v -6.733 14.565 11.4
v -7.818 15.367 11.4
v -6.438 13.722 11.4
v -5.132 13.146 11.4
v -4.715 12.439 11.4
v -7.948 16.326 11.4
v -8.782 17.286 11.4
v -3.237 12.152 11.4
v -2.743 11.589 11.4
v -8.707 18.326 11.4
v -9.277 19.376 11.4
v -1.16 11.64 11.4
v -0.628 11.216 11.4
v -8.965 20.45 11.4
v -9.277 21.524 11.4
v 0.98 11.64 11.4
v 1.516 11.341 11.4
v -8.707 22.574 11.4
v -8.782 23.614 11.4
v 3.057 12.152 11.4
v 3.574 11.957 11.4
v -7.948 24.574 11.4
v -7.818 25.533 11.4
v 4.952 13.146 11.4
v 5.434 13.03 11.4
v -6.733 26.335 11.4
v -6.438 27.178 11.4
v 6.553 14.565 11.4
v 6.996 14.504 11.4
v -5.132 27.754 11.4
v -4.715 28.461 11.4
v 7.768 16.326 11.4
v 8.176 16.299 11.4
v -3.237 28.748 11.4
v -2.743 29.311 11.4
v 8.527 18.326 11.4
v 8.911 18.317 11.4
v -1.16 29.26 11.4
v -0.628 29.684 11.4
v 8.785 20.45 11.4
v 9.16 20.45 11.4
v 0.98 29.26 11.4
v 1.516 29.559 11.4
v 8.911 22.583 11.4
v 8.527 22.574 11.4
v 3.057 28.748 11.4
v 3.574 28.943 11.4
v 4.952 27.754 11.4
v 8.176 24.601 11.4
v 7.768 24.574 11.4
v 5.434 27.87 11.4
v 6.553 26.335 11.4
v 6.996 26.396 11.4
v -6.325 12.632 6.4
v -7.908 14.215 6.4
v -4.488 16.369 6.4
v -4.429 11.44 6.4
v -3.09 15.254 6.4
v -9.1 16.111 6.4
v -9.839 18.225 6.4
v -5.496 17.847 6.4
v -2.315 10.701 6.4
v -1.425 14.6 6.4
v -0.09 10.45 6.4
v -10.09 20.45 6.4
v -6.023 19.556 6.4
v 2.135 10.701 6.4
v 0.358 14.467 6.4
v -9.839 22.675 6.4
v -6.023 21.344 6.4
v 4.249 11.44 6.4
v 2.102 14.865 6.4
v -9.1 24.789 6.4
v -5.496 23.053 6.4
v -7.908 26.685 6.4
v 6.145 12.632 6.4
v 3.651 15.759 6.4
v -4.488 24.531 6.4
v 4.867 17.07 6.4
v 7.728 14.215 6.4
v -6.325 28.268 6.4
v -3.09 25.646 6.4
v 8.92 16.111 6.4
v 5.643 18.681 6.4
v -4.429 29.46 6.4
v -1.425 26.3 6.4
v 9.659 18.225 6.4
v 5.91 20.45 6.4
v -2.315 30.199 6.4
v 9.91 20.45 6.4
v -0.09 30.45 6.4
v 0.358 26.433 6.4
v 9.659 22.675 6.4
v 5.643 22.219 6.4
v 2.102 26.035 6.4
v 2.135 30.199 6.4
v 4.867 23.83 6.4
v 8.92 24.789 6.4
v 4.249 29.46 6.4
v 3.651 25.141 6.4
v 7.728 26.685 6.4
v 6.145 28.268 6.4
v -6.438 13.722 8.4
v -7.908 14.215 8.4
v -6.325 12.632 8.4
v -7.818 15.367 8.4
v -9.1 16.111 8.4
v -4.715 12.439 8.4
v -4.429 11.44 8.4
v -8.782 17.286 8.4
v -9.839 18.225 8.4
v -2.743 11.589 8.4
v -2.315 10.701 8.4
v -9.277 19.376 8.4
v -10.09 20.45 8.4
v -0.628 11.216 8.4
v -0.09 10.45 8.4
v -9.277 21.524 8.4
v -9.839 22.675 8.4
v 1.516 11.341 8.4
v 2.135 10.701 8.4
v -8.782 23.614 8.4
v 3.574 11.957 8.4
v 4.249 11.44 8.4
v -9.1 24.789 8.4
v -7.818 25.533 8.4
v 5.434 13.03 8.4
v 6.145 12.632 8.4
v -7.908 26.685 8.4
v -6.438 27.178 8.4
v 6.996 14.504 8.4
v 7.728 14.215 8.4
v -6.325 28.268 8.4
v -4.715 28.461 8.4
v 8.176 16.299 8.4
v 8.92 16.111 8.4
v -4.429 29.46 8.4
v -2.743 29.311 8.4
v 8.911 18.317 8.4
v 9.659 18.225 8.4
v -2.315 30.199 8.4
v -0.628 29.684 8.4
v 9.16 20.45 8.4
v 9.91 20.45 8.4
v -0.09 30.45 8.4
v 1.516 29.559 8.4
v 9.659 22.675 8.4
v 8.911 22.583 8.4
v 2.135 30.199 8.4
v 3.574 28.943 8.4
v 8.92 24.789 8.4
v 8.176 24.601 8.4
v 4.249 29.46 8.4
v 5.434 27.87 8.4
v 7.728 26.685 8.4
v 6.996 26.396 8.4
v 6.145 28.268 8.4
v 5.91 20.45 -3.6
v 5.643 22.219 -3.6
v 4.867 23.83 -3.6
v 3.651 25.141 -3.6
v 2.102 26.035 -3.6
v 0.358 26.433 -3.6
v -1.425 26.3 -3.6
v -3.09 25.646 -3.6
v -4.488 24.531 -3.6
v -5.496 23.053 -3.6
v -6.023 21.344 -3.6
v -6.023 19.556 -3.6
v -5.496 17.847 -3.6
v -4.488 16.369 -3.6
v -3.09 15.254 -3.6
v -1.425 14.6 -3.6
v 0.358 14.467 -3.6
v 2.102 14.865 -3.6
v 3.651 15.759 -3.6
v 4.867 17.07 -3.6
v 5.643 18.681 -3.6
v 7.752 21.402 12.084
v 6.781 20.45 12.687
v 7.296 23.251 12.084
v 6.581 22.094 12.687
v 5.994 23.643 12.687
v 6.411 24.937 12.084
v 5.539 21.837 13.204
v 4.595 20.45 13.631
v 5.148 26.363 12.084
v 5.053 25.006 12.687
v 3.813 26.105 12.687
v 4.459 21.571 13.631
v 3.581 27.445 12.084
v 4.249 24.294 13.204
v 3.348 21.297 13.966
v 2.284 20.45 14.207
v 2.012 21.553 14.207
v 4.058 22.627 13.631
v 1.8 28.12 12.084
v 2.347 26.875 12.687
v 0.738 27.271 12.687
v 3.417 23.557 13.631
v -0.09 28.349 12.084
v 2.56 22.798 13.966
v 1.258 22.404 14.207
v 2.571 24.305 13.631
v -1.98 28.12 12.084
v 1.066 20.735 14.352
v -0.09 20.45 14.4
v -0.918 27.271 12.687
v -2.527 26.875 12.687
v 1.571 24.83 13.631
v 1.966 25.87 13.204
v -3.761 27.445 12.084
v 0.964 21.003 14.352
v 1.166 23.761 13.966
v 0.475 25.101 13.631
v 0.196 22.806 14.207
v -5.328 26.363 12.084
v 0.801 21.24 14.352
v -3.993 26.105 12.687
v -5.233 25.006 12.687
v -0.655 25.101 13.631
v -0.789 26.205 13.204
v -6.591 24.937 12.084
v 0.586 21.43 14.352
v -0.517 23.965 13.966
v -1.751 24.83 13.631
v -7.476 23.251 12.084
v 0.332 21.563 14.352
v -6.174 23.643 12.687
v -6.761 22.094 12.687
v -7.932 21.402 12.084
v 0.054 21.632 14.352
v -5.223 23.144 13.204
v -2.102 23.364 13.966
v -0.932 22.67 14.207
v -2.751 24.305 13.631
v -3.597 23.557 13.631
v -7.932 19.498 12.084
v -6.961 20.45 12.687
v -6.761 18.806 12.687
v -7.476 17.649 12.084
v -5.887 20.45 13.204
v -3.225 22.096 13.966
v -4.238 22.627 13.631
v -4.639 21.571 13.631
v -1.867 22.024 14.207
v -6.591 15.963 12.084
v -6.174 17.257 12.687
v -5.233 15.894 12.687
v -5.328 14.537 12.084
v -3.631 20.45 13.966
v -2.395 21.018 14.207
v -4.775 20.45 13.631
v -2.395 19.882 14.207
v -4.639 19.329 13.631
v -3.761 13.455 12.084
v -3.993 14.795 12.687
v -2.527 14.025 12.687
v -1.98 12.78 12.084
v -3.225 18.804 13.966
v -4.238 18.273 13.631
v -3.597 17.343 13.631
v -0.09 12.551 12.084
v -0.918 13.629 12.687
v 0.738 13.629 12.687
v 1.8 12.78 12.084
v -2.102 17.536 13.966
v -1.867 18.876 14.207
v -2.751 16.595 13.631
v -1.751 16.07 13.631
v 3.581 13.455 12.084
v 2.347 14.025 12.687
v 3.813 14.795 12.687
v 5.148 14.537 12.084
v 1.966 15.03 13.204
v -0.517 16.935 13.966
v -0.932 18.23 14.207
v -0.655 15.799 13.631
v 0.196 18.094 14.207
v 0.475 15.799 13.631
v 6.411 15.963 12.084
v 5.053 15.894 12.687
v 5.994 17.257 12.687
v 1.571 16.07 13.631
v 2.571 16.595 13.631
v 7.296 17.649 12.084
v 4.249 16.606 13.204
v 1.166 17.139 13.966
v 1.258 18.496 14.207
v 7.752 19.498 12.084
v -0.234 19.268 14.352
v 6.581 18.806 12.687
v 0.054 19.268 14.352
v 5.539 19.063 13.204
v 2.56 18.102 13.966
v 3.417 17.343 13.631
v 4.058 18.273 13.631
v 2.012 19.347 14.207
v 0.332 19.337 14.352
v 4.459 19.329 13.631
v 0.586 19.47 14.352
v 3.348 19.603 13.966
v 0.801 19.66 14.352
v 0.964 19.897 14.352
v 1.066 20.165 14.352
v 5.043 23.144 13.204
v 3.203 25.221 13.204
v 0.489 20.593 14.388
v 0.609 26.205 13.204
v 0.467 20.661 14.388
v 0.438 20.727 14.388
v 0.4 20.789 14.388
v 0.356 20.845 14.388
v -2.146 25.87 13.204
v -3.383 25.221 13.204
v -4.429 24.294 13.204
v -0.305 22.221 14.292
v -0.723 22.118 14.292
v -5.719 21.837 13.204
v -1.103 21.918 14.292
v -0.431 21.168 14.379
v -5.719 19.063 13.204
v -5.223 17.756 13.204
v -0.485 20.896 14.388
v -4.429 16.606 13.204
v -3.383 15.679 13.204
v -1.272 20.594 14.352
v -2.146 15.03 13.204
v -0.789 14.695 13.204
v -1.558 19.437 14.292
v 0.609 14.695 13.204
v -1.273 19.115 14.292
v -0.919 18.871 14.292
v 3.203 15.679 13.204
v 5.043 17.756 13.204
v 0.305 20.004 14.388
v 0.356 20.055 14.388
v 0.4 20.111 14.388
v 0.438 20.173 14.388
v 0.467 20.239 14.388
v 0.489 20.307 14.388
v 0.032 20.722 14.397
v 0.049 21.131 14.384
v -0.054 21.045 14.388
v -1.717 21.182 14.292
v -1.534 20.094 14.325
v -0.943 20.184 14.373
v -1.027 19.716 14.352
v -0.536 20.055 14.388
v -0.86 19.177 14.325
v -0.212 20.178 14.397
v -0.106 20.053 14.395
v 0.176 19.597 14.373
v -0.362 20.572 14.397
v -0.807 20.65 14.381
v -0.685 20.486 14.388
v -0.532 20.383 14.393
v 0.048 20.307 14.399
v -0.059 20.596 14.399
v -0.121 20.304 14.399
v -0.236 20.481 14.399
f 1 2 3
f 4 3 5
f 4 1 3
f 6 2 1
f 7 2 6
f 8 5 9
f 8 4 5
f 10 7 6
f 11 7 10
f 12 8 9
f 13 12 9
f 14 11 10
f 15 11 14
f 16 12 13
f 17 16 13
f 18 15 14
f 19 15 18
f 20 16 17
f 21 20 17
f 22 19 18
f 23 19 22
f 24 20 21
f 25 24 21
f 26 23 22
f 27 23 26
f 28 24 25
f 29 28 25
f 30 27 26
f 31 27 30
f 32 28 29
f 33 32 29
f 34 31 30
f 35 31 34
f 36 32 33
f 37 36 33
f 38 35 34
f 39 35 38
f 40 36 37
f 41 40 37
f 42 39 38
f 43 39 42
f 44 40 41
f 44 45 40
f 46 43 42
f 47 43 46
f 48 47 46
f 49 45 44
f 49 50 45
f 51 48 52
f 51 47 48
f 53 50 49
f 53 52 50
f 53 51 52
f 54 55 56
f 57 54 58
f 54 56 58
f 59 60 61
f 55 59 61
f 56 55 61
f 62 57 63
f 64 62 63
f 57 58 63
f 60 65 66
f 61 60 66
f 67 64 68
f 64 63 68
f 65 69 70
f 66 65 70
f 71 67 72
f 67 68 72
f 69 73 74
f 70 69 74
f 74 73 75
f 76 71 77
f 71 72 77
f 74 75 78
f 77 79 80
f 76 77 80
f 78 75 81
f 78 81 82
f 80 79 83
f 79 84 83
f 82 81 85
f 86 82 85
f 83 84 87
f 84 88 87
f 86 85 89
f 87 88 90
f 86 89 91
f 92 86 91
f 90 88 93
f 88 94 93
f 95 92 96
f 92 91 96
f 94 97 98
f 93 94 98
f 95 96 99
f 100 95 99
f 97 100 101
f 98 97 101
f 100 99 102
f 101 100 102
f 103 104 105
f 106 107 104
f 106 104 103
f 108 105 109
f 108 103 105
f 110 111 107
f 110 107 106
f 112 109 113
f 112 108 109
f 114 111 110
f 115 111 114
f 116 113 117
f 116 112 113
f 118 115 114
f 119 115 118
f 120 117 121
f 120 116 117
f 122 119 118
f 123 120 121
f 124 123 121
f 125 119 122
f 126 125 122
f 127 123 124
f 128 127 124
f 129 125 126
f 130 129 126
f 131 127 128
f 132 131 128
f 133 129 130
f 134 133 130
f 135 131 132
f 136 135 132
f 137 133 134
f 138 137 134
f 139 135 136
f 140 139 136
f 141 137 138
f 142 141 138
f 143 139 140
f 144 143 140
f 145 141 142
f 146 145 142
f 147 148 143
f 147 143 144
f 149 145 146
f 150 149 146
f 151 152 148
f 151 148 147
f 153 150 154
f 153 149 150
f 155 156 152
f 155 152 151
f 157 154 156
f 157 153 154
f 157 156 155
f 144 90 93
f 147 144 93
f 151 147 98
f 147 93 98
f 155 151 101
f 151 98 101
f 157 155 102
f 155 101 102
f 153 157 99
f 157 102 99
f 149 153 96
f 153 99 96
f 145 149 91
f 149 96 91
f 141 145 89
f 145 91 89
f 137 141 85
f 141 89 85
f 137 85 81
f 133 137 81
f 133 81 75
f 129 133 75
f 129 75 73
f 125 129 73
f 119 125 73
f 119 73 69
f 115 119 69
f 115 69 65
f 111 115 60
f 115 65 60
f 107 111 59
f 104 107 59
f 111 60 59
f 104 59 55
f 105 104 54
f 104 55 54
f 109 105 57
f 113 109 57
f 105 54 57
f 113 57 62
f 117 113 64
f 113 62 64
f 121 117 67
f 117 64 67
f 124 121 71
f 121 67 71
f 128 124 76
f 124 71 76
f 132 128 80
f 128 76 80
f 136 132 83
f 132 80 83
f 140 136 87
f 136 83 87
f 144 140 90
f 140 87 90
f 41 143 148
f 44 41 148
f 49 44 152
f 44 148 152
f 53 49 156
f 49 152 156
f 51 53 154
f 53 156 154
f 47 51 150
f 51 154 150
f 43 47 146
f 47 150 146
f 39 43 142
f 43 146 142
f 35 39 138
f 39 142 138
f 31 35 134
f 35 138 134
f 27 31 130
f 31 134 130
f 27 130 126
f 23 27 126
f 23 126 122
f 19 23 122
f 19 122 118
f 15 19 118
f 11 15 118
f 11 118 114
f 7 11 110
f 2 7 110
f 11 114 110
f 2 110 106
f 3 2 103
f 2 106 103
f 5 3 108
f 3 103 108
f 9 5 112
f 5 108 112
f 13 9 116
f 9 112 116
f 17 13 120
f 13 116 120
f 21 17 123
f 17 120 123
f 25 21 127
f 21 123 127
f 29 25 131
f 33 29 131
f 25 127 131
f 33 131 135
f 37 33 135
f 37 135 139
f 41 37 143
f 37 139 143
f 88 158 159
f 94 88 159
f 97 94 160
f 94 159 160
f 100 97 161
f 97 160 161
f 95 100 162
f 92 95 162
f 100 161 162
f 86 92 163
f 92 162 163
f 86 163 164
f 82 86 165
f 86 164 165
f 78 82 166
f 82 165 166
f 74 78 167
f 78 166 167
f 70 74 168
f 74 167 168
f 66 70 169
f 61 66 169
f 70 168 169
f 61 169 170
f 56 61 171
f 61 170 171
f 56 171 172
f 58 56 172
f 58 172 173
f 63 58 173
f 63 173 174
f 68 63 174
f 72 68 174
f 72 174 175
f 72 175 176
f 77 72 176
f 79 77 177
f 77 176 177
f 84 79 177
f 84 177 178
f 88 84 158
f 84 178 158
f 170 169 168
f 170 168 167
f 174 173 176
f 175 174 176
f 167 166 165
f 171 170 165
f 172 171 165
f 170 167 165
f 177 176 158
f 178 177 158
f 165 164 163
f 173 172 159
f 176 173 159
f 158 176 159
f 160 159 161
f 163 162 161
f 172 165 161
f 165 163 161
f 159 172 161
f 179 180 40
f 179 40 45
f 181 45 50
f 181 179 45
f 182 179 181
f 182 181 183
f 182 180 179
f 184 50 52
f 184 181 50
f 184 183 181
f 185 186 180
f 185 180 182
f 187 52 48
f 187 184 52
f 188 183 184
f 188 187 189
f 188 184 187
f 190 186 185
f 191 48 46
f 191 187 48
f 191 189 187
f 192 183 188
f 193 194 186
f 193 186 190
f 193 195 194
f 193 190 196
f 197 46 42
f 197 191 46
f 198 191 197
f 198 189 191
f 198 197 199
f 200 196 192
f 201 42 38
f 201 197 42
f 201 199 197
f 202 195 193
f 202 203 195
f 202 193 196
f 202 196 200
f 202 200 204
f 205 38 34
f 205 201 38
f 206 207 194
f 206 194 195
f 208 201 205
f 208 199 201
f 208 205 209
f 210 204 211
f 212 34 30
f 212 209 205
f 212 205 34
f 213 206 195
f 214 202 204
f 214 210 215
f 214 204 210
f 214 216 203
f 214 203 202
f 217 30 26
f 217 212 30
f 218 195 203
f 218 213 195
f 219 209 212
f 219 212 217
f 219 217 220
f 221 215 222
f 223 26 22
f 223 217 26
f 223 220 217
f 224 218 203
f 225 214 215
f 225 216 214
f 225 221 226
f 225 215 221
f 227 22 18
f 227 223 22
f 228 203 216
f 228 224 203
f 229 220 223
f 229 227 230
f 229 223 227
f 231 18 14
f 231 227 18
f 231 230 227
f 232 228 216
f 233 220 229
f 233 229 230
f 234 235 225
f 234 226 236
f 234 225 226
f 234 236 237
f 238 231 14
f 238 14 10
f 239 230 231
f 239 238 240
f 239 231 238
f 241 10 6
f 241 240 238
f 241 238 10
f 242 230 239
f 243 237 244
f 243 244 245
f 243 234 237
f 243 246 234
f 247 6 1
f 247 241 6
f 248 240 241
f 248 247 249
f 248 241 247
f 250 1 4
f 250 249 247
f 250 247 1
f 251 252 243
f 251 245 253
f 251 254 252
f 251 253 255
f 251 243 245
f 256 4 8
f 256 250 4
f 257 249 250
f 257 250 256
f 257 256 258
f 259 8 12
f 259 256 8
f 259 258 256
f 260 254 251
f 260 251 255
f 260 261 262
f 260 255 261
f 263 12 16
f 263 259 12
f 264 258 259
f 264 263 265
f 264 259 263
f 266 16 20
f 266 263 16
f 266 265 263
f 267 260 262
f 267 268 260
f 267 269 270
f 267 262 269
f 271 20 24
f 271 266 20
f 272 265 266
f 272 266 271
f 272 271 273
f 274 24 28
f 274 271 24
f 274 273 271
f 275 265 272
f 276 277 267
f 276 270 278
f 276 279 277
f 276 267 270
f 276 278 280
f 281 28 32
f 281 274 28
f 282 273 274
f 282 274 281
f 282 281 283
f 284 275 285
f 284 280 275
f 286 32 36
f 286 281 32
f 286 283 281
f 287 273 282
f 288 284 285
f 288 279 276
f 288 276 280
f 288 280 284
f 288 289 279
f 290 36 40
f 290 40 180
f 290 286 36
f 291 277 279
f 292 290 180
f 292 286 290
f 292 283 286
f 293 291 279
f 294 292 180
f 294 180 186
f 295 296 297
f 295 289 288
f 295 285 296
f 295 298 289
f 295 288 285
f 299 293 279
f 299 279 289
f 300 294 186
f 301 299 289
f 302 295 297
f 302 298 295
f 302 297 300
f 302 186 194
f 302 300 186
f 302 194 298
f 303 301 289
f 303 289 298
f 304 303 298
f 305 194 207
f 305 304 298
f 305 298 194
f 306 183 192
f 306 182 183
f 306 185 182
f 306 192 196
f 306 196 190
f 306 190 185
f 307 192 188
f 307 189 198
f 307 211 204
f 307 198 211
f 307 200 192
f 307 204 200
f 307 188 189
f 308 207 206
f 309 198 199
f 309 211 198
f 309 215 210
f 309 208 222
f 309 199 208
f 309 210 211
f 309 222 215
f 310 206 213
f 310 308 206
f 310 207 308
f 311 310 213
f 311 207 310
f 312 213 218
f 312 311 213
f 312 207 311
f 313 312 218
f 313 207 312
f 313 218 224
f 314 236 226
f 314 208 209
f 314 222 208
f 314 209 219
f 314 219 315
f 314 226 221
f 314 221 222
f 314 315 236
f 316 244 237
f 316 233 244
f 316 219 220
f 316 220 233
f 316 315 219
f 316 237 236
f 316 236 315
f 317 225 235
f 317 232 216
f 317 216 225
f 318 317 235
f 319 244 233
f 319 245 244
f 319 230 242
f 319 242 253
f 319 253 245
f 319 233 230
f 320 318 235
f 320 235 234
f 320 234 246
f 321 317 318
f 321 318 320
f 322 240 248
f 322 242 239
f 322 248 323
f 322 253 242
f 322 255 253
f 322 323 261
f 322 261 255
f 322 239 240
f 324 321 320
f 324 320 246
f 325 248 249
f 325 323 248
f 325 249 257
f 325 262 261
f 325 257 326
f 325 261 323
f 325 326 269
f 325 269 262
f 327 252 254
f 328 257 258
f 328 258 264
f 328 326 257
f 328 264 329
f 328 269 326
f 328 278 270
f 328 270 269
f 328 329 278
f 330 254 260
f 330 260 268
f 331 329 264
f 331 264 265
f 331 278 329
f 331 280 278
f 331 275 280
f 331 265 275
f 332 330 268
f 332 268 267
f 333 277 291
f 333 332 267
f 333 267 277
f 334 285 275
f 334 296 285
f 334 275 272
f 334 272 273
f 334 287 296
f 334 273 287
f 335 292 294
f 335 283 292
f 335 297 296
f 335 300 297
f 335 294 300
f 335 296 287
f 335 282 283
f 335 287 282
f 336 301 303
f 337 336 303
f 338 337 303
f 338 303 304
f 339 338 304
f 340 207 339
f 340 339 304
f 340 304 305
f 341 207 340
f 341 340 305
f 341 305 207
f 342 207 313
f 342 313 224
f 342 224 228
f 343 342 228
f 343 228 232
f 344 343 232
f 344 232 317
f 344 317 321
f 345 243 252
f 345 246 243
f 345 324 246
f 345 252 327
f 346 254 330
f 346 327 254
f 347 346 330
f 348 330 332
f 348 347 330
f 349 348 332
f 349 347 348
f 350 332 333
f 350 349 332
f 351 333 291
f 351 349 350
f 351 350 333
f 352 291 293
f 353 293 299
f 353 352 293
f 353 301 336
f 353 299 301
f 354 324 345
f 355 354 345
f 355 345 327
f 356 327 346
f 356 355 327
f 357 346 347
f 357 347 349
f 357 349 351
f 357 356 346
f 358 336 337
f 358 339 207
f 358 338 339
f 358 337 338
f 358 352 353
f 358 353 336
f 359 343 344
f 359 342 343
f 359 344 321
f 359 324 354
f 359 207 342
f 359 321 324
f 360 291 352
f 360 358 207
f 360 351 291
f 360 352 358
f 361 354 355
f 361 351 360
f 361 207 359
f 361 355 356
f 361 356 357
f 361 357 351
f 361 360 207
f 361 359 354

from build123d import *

# Parameters (mm, degrees)
SKETCH070_R       = 6
PAD046_DEPTH      = 10
SKETCH071_R       = 10
PAD047_DEPTH      = 2
SKETCH072_R       = 9.25
PAD048_DEPTH      = 3
SKETCH073_R       = 8.875
POCKET068_DEPTH   = 0.2
POCKET068_FACE9_R = 8.875
PAD049_DEPTH      = 3.2


with BuildPart() as part:
    # Sketch070 → Pad046 (new body)
    with BuildSketch(Plane.XY):
        Circle(SKETCH070_R)
    extrude(amount=PAD046_DEPTH)

    # Sketch071 (on Face3 of Pad046) → Pad047 (join)
    with BuildSketch(Plane.XY.offset(10)):
        Circle(SKETCH071_R)
    extrude(amount=PAD047_DEPTH)

    # Sketch072 (on Face3 of Pad047) → Pad048 (join)
    with BuildSketch(Plane.XY.offset(12)):
        Circle(SKETCH072_R)
    extrude(amount=PAD048_DEPTH)

    # Sketch073 (on Face7 of Pad048) → Pocket068 (cut)
    with BuildSketch(Plane.XY.offset(15)):
        Circle(SKETCH073_R)
    extrude(amount=-POCKET068_DEPTH, mode=Mode.SUBTRACT)

    # Pocket068 Face9 → Pad049 (add)
    with BuildSketch(Plane(origin=(0, 0, 14.8), x_dir=(0, 1, 0), z_dir=(0, 0, 1))):
        Circle(POCKET068_FACE9_R)
    extrude(amount=PAD049_DEPTH)

    # Sketch074 → Groove (revolve, cut)
    with BuildSketch(Plane.XZ):
        with BuildLine():
            ThreePointArc((8.875, 15), (4.684658, 17.231174), (0, 18))
            Line((0, 19), (0, 18))
            Line((0, 19), (8.875, 19))
            Line((8.875, 19), (8.875, 15))
        make_face()
    revolve(axis=Axis((0, 0, 0), (0, 0, 1)), mode=Mode.SUBTRACT)


with BuildPart() as part_1:
    # Body006 placement: moved
    add(part.part.moved(Location((-0.09, 20.45, -3.6))))


solid = part_1.part
